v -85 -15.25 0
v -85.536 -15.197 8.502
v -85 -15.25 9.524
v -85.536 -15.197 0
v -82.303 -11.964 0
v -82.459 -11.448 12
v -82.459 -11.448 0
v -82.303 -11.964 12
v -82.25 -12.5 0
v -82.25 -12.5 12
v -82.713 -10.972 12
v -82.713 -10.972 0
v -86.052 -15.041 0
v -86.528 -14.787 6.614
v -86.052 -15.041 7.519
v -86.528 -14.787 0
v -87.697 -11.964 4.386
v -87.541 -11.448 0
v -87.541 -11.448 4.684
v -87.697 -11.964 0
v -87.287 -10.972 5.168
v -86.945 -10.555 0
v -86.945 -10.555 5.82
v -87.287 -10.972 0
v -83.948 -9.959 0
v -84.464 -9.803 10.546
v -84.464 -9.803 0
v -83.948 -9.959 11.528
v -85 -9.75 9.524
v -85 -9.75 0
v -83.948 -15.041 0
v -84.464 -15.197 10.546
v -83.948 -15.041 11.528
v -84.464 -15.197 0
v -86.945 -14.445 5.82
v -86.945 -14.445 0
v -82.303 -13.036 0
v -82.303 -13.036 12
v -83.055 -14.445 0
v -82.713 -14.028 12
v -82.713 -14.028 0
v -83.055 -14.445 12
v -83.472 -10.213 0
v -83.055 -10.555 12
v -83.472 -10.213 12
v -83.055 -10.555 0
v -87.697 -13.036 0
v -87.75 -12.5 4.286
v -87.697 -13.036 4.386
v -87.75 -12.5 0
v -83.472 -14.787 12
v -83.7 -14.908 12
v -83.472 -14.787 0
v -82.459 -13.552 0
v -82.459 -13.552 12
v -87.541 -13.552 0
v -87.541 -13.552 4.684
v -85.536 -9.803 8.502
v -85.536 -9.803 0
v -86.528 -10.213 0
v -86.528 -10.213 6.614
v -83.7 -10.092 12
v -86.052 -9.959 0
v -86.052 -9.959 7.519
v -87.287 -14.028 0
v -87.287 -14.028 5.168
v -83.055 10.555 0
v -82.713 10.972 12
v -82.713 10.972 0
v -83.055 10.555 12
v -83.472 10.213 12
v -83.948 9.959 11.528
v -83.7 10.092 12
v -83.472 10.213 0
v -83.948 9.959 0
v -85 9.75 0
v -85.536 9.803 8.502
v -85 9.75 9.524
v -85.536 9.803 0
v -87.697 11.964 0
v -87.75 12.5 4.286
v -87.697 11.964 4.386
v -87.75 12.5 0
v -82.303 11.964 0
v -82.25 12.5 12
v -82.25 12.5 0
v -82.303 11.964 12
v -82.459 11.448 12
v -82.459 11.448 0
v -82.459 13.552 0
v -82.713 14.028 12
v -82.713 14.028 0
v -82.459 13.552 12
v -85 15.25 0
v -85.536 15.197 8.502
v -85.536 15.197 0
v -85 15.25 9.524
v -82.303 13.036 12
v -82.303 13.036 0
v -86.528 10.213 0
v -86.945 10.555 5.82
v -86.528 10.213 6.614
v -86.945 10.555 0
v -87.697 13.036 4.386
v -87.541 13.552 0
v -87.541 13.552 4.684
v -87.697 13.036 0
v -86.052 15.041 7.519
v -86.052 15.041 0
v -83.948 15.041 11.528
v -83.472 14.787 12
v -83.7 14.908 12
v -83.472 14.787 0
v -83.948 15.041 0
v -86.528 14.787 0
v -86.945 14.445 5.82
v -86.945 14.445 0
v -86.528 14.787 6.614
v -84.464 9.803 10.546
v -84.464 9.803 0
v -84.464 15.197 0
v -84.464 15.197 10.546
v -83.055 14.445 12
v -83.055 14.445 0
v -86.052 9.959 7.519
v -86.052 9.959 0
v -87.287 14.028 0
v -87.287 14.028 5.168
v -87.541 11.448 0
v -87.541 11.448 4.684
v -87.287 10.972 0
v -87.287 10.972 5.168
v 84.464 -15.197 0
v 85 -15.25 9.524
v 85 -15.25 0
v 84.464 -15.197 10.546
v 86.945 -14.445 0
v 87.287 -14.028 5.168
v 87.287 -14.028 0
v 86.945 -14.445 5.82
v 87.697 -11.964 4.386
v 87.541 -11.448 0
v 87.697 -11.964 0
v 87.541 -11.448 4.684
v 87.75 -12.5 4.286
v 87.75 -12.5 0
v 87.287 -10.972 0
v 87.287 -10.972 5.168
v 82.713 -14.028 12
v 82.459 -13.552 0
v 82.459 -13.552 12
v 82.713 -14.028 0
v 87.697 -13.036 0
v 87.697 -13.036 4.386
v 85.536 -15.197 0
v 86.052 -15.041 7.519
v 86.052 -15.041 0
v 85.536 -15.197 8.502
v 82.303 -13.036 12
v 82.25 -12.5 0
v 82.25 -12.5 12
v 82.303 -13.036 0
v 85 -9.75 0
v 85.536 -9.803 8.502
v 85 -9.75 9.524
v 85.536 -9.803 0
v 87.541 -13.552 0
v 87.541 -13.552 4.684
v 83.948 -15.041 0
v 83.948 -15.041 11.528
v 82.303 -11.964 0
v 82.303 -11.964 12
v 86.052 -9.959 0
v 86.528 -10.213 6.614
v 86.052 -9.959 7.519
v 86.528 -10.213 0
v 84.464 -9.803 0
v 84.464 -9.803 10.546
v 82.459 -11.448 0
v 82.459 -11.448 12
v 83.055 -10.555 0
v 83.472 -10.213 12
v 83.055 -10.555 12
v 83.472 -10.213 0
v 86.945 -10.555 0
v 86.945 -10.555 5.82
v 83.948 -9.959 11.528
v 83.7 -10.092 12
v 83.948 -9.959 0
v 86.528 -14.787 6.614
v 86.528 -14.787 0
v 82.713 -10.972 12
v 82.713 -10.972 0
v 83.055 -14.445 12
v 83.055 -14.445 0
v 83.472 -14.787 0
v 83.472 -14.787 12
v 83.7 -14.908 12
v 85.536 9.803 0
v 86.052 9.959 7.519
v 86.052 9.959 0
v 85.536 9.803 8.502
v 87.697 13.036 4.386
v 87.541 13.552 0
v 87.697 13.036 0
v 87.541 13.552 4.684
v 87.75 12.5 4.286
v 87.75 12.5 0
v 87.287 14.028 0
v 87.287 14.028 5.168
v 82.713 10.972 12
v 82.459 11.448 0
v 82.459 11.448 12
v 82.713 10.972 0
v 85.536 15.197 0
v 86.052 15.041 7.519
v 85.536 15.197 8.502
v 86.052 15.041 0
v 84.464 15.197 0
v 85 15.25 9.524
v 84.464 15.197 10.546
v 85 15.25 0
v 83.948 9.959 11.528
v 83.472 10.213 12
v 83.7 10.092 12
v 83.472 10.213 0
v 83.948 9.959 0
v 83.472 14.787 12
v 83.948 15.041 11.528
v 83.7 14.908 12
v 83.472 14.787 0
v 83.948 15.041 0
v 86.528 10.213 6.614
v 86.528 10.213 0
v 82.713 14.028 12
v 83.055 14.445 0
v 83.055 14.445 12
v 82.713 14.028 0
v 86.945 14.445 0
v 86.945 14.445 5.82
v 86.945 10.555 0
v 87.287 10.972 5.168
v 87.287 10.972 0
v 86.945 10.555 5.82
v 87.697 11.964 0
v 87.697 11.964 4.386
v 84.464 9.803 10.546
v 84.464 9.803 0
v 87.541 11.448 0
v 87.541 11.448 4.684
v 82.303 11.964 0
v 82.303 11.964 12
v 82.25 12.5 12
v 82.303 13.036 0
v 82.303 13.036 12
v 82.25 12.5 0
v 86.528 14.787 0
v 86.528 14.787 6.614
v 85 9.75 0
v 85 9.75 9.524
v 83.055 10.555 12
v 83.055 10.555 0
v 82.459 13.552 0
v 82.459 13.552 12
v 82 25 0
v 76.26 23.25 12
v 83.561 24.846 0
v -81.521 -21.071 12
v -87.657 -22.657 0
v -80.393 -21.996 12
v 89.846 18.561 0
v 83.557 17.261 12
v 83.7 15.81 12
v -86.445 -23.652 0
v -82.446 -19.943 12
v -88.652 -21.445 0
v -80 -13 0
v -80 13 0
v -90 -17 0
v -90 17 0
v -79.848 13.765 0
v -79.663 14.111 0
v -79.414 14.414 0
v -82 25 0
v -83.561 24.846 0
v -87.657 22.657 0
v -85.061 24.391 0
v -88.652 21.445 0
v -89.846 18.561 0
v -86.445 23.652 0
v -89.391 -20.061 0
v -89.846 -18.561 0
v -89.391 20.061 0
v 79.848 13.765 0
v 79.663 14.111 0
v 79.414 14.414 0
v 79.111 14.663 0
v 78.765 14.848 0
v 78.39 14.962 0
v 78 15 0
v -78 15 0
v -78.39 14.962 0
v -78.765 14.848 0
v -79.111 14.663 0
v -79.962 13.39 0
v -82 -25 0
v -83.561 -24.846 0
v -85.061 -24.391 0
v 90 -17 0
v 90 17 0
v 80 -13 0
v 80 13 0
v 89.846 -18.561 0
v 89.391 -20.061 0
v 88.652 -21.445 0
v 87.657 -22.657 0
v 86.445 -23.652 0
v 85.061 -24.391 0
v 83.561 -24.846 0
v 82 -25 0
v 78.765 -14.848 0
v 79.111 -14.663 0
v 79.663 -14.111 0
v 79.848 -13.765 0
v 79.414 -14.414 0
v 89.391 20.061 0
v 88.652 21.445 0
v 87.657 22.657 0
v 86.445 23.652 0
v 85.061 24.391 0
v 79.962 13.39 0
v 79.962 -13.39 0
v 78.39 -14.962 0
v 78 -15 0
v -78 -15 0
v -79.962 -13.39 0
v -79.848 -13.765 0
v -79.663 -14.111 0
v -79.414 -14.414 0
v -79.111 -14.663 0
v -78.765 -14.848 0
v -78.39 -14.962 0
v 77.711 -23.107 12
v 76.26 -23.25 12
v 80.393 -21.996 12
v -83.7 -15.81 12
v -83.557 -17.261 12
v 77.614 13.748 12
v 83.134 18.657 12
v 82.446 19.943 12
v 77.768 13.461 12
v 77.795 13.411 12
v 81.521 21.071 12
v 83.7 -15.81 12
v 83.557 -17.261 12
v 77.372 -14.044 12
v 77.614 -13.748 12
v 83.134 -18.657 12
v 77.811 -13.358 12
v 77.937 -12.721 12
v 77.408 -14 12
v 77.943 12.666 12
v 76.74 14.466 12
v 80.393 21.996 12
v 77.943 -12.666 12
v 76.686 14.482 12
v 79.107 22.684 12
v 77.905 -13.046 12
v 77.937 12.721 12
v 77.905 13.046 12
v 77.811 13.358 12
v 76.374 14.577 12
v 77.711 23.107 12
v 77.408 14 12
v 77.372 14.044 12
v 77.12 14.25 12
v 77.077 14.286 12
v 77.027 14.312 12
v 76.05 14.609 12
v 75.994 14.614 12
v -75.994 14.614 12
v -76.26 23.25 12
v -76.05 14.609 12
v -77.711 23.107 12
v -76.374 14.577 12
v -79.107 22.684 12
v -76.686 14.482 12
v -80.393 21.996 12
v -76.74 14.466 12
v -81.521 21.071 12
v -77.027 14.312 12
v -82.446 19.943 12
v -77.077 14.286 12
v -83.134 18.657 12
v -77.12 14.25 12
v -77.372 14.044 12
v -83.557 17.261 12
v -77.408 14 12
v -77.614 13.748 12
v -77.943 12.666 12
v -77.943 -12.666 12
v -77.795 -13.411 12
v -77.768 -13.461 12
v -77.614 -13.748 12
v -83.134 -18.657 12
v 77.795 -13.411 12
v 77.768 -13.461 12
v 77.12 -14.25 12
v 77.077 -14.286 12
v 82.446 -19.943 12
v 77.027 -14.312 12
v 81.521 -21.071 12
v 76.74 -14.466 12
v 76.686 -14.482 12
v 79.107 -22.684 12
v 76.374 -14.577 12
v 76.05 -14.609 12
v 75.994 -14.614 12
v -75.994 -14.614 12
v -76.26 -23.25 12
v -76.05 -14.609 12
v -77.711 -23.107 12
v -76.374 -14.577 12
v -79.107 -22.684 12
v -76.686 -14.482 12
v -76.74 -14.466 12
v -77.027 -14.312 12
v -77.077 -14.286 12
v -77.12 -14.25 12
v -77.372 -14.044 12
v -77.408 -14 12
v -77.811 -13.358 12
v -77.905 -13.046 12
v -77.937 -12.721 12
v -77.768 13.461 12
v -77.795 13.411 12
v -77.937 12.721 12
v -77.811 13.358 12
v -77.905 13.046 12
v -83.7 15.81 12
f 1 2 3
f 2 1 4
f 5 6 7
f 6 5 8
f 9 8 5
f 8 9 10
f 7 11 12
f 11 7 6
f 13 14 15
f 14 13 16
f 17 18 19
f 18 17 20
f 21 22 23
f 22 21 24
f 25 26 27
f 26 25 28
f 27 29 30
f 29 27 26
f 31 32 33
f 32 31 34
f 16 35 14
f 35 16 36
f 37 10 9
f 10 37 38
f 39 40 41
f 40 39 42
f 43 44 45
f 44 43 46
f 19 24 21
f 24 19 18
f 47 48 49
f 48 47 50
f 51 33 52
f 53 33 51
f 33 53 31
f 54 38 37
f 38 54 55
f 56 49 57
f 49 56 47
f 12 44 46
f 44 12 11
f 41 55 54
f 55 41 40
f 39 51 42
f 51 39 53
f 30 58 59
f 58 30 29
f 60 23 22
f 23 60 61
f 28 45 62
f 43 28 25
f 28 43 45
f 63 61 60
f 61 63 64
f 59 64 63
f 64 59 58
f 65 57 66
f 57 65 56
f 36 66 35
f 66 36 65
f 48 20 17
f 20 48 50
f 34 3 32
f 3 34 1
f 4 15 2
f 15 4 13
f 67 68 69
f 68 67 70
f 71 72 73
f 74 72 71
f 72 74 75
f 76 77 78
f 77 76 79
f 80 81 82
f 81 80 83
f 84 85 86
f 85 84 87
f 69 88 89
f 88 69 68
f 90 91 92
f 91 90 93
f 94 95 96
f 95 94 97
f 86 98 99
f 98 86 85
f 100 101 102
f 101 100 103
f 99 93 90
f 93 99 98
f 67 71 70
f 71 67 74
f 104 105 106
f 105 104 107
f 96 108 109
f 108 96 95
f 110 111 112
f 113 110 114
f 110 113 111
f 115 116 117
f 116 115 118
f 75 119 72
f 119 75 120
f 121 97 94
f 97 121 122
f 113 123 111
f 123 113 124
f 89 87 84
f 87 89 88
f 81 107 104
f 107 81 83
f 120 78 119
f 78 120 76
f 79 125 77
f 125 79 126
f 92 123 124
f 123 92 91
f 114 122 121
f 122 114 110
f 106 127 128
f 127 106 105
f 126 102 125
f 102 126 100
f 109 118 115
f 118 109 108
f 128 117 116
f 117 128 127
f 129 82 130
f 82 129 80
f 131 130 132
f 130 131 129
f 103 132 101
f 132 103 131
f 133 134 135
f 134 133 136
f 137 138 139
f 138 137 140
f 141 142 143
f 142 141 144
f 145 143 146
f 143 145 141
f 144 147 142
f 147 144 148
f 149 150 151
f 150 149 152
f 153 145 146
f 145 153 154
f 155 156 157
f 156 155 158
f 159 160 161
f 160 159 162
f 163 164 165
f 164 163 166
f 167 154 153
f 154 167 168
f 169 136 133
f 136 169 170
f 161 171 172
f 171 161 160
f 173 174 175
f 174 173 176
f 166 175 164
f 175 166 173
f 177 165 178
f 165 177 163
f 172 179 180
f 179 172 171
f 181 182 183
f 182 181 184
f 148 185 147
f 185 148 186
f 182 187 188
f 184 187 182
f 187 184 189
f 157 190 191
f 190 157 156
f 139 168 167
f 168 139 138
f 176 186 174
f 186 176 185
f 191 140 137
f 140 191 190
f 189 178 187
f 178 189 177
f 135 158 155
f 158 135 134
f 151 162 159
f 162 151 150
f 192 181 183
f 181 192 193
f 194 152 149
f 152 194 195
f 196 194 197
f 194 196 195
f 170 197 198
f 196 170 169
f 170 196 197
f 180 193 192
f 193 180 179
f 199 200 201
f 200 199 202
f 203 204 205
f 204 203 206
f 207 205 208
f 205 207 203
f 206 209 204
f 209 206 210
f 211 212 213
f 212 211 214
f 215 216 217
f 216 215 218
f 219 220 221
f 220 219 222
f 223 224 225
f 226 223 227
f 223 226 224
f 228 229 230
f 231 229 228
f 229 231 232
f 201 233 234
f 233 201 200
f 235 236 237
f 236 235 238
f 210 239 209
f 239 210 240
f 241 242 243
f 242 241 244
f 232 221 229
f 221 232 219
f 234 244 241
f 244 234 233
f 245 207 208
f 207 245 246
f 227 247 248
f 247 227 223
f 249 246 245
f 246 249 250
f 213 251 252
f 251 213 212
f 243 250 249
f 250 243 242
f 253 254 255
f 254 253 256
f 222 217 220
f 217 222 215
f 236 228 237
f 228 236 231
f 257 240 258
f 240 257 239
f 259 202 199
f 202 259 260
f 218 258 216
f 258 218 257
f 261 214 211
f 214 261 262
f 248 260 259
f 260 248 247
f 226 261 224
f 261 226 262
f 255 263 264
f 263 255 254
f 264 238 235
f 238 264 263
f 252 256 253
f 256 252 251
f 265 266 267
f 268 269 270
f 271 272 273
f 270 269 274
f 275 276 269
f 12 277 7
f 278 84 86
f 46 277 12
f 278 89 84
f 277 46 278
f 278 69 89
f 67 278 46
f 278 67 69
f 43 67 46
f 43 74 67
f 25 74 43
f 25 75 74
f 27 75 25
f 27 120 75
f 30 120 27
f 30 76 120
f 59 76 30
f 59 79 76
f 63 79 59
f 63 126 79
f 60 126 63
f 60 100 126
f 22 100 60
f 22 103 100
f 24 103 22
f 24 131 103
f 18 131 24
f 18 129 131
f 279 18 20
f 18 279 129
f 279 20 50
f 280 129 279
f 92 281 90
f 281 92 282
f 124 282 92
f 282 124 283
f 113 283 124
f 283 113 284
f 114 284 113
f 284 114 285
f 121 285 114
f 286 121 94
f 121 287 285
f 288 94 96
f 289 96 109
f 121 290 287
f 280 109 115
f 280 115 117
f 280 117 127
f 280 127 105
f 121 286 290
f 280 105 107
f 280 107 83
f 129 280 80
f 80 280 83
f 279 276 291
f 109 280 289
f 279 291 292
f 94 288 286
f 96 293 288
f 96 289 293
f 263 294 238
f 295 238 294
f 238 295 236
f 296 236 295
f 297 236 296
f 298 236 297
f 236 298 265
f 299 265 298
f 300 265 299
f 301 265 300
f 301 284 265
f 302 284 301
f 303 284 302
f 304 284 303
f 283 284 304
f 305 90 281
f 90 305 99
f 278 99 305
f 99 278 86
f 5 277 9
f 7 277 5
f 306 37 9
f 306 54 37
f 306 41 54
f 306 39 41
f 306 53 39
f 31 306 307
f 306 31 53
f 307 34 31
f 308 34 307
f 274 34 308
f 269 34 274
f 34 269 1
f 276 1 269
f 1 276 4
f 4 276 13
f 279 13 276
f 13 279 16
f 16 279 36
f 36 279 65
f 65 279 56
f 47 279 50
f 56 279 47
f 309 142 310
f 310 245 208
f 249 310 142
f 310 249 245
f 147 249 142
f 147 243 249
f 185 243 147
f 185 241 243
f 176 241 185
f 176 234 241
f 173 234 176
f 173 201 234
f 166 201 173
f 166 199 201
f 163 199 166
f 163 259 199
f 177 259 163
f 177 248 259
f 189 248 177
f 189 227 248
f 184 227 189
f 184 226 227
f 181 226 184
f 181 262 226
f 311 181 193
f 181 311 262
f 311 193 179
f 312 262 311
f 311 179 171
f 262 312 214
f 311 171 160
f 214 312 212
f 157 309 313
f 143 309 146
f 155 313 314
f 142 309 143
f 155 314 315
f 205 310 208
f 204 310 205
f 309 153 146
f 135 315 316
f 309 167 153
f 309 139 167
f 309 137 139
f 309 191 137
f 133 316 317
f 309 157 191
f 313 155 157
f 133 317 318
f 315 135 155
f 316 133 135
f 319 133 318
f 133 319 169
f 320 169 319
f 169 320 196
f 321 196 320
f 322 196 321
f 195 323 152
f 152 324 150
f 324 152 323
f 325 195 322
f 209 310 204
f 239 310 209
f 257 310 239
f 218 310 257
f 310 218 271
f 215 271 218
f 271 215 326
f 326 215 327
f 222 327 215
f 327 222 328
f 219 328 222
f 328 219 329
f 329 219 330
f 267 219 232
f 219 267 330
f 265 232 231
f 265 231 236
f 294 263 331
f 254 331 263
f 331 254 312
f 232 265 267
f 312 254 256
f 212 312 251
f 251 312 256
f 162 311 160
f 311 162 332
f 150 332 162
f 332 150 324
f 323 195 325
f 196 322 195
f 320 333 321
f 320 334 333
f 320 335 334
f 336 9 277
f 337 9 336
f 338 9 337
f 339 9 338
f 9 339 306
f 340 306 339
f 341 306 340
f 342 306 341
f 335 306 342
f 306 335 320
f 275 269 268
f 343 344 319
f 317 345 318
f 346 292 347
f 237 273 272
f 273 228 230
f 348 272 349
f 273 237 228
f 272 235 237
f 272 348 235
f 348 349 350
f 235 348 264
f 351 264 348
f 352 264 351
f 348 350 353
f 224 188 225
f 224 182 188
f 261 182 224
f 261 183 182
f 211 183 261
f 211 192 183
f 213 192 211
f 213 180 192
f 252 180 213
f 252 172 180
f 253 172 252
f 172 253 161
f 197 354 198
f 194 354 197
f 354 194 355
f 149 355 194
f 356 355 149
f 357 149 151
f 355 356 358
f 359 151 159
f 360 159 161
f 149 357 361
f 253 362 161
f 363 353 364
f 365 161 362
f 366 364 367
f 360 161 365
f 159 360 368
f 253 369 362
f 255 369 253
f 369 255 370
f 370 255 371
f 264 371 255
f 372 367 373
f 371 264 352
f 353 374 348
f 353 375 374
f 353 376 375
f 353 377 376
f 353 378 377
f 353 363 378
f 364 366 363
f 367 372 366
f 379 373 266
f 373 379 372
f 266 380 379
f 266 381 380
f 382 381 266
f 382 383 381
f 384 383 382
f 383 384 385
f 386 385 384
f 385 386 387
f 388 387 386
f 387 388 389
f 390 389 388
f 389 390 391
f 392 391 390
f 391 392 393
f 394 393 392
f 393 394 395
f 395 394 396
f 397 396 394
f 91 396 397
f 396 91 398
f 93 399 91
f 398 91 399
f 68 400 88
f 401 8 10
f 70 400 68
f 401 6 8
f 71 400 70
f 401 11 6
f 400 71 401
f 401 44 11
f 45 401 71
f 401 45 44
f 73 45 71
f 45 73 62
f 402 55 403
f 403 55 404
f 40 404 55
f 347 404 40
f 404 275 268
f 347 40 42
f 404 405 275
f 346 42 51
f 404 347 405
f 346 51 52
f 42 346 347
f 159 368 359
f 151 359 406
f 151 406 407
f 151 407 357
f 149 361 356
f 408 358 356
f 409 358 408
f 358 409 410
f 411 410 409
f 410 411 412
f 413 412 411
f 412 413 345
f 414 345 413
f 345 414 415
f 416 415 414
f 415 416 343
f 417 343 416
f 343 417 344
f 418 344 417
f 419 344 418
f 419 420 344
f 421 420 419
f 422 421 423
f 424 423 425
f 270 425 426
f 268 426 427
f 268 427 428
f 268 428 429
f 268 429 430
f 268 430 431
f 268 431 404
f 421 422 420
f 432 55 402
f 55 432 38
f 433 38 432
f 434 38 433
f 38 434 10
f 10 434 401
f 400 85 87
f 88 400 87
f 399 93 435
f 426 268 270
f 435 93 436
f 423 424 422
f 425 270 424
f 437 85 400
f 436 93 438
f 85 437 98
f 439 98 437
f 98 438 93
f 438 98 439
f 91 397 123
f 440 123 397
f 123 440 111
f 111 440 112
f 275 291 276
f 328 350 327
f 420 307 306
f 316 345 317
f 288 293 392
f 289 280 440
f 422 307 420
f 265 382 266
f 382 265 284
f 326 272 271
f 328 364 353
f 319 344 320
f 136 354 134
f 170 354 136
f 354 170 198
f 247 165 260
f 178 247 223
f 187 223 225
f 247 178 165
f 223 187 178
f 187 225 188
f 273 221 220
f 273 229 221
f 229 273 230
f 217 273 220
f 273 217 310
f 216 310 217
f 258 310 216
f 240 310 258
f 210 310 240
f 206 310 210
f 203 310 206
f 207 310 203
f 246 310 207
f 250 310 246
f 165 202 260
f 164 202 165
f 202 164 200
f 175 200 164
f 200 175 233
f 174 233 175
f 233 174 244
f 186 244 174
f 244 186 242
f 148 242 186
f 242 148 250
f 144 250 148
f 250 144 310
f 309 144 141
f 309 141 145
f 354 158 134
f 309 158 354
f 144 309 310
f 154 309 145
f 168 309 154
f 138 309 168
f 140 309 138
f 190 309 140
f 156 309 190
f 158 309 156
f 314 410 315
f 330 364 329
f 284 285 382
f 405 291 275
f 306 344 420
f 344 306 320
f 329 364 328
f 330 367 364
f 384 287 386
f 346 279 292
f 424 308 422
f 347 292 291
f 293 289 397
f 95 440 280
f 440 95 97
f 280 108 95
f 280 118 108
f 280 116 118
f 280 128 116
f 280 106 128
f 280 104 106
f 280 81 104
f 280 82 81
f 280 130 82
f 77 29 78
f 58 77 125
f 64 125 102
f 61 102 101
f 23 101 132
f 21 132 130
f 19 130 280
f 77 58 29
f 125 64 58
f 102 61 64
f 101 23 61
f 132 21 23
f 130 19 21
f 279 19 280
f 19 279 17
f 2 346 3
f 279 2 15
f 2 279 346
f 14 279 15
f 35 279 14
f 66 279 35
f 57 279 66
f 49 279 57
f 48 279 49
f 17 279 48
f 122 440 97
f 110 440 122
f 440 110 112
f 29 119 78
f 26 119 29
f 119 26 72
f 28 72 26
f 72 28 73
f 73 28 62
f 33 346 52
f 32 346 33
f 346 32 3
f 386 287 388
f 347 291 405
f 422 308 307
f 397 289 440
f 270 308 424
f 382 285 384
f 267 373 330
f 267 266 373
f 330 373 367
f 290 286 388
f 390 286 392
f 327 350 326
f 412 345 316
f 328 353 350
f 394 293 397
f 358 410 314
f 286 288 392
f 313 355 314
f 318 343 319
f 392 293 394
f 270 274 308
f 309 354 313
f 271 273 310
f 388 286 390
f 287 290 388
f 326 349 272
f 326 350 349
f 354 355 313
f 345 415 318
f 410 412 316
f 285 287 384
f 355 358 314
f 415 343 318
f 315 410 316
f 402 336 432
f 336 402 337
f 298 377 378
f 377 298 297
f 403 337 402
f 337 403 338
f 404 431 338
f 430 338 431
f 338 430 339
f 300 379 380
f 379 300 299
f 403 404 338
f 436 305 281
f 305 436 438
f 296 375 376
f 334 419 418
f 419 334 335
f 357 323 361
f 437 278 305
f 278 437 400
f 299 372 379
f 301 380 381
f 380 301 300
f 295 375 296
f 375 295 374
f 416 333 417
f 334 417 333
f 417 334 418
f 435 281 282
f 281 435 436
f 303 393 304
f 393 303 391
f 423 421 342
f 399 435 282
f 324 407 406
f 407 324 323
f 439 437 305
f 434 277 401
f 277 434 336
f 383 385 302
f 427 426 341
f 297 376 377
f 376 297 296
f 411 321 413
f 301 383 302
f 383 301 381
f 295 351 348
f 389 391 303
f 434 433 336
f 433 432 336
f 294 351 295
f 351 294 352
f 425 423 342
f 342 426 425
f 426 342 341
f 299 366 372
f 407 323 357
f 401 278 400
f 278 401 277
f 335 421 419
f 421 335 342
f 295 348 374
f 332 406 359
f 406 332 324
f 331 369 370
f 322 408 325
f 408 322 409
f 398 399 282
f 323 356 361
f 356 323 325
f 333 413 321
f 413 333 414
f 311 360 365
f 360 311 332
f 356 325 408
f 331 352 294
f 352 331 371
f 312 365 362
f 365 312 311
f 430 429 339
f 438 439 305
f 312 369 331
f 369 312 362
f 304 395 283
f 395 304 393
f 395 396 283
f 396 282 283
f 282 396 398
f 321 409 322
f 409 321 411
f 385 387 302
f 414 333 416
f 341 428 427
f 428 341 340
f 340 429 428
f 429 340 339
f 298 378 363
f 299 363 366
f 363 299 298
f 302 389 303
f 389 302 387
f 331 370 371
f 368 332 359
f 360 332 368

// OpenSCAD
$fn = 32;

// ----------------------------------------------------------------------
// Display bezel: 180 x 50 mm frame, opening 160x30 mm
// ----------------------------------------------------------------------

// --- parameters (mm) ---
length = 180;             // frame outside length, X
width = 50;               // frame outside width, Y
frame_w = 10;             // frame width
thickness = 12;           // frame thickness
corner_r = 8;             // outside corner radius
chamfer = 0.93;           // outer wall taper
funnel = 0.97;            // inner opening taper
opening_l = 160;          // opening length
opening_w = 30;           // opening width
inner_r = 2;              // opening corner radius
hole_d = 5.5;             // mounting screw clearance
holes_per_side = 2;       // holes per short side
hole_inset = 5;           // hole centre inset from the outside edge

/* rounded-rectangle outlines, generated with loops */
module rounded_ring(l_nom, w_nom, r) {
  hull() {
    for (sx = [-1, 1]) for (sy = [-1, 1])
      translate([sx * (l_nom / 2 - r), sy * (w_nom / 2 - r)]) circle(r = r);
  }
}

difference() {
  /* frame body, drafted so the outer edge is a variable-depth chamfer */
  linear_extrude(height = thickness, scale = chamfer)
    rounded_ring(length, width, corner_r);
  /* viewing opening, drafted the other way for a funnel edge */
  linear_extrude(height = thickness + 2, scale = funnel)
    translate([0, 0, -1]) rounded_ring(opening_l, opening_w, inner_r);
  /* mounting screws through the frame lands */
  for (sx = [-1, 1]) for (i = [1 : holes_per_side])
    translate([sx * (length / 2 - hole_inset),
               (i - (holes_per_side + 1) / 2) * width * 0.5, -1])
      cylinder(h = thickness + 2, d = hole_d);
}
